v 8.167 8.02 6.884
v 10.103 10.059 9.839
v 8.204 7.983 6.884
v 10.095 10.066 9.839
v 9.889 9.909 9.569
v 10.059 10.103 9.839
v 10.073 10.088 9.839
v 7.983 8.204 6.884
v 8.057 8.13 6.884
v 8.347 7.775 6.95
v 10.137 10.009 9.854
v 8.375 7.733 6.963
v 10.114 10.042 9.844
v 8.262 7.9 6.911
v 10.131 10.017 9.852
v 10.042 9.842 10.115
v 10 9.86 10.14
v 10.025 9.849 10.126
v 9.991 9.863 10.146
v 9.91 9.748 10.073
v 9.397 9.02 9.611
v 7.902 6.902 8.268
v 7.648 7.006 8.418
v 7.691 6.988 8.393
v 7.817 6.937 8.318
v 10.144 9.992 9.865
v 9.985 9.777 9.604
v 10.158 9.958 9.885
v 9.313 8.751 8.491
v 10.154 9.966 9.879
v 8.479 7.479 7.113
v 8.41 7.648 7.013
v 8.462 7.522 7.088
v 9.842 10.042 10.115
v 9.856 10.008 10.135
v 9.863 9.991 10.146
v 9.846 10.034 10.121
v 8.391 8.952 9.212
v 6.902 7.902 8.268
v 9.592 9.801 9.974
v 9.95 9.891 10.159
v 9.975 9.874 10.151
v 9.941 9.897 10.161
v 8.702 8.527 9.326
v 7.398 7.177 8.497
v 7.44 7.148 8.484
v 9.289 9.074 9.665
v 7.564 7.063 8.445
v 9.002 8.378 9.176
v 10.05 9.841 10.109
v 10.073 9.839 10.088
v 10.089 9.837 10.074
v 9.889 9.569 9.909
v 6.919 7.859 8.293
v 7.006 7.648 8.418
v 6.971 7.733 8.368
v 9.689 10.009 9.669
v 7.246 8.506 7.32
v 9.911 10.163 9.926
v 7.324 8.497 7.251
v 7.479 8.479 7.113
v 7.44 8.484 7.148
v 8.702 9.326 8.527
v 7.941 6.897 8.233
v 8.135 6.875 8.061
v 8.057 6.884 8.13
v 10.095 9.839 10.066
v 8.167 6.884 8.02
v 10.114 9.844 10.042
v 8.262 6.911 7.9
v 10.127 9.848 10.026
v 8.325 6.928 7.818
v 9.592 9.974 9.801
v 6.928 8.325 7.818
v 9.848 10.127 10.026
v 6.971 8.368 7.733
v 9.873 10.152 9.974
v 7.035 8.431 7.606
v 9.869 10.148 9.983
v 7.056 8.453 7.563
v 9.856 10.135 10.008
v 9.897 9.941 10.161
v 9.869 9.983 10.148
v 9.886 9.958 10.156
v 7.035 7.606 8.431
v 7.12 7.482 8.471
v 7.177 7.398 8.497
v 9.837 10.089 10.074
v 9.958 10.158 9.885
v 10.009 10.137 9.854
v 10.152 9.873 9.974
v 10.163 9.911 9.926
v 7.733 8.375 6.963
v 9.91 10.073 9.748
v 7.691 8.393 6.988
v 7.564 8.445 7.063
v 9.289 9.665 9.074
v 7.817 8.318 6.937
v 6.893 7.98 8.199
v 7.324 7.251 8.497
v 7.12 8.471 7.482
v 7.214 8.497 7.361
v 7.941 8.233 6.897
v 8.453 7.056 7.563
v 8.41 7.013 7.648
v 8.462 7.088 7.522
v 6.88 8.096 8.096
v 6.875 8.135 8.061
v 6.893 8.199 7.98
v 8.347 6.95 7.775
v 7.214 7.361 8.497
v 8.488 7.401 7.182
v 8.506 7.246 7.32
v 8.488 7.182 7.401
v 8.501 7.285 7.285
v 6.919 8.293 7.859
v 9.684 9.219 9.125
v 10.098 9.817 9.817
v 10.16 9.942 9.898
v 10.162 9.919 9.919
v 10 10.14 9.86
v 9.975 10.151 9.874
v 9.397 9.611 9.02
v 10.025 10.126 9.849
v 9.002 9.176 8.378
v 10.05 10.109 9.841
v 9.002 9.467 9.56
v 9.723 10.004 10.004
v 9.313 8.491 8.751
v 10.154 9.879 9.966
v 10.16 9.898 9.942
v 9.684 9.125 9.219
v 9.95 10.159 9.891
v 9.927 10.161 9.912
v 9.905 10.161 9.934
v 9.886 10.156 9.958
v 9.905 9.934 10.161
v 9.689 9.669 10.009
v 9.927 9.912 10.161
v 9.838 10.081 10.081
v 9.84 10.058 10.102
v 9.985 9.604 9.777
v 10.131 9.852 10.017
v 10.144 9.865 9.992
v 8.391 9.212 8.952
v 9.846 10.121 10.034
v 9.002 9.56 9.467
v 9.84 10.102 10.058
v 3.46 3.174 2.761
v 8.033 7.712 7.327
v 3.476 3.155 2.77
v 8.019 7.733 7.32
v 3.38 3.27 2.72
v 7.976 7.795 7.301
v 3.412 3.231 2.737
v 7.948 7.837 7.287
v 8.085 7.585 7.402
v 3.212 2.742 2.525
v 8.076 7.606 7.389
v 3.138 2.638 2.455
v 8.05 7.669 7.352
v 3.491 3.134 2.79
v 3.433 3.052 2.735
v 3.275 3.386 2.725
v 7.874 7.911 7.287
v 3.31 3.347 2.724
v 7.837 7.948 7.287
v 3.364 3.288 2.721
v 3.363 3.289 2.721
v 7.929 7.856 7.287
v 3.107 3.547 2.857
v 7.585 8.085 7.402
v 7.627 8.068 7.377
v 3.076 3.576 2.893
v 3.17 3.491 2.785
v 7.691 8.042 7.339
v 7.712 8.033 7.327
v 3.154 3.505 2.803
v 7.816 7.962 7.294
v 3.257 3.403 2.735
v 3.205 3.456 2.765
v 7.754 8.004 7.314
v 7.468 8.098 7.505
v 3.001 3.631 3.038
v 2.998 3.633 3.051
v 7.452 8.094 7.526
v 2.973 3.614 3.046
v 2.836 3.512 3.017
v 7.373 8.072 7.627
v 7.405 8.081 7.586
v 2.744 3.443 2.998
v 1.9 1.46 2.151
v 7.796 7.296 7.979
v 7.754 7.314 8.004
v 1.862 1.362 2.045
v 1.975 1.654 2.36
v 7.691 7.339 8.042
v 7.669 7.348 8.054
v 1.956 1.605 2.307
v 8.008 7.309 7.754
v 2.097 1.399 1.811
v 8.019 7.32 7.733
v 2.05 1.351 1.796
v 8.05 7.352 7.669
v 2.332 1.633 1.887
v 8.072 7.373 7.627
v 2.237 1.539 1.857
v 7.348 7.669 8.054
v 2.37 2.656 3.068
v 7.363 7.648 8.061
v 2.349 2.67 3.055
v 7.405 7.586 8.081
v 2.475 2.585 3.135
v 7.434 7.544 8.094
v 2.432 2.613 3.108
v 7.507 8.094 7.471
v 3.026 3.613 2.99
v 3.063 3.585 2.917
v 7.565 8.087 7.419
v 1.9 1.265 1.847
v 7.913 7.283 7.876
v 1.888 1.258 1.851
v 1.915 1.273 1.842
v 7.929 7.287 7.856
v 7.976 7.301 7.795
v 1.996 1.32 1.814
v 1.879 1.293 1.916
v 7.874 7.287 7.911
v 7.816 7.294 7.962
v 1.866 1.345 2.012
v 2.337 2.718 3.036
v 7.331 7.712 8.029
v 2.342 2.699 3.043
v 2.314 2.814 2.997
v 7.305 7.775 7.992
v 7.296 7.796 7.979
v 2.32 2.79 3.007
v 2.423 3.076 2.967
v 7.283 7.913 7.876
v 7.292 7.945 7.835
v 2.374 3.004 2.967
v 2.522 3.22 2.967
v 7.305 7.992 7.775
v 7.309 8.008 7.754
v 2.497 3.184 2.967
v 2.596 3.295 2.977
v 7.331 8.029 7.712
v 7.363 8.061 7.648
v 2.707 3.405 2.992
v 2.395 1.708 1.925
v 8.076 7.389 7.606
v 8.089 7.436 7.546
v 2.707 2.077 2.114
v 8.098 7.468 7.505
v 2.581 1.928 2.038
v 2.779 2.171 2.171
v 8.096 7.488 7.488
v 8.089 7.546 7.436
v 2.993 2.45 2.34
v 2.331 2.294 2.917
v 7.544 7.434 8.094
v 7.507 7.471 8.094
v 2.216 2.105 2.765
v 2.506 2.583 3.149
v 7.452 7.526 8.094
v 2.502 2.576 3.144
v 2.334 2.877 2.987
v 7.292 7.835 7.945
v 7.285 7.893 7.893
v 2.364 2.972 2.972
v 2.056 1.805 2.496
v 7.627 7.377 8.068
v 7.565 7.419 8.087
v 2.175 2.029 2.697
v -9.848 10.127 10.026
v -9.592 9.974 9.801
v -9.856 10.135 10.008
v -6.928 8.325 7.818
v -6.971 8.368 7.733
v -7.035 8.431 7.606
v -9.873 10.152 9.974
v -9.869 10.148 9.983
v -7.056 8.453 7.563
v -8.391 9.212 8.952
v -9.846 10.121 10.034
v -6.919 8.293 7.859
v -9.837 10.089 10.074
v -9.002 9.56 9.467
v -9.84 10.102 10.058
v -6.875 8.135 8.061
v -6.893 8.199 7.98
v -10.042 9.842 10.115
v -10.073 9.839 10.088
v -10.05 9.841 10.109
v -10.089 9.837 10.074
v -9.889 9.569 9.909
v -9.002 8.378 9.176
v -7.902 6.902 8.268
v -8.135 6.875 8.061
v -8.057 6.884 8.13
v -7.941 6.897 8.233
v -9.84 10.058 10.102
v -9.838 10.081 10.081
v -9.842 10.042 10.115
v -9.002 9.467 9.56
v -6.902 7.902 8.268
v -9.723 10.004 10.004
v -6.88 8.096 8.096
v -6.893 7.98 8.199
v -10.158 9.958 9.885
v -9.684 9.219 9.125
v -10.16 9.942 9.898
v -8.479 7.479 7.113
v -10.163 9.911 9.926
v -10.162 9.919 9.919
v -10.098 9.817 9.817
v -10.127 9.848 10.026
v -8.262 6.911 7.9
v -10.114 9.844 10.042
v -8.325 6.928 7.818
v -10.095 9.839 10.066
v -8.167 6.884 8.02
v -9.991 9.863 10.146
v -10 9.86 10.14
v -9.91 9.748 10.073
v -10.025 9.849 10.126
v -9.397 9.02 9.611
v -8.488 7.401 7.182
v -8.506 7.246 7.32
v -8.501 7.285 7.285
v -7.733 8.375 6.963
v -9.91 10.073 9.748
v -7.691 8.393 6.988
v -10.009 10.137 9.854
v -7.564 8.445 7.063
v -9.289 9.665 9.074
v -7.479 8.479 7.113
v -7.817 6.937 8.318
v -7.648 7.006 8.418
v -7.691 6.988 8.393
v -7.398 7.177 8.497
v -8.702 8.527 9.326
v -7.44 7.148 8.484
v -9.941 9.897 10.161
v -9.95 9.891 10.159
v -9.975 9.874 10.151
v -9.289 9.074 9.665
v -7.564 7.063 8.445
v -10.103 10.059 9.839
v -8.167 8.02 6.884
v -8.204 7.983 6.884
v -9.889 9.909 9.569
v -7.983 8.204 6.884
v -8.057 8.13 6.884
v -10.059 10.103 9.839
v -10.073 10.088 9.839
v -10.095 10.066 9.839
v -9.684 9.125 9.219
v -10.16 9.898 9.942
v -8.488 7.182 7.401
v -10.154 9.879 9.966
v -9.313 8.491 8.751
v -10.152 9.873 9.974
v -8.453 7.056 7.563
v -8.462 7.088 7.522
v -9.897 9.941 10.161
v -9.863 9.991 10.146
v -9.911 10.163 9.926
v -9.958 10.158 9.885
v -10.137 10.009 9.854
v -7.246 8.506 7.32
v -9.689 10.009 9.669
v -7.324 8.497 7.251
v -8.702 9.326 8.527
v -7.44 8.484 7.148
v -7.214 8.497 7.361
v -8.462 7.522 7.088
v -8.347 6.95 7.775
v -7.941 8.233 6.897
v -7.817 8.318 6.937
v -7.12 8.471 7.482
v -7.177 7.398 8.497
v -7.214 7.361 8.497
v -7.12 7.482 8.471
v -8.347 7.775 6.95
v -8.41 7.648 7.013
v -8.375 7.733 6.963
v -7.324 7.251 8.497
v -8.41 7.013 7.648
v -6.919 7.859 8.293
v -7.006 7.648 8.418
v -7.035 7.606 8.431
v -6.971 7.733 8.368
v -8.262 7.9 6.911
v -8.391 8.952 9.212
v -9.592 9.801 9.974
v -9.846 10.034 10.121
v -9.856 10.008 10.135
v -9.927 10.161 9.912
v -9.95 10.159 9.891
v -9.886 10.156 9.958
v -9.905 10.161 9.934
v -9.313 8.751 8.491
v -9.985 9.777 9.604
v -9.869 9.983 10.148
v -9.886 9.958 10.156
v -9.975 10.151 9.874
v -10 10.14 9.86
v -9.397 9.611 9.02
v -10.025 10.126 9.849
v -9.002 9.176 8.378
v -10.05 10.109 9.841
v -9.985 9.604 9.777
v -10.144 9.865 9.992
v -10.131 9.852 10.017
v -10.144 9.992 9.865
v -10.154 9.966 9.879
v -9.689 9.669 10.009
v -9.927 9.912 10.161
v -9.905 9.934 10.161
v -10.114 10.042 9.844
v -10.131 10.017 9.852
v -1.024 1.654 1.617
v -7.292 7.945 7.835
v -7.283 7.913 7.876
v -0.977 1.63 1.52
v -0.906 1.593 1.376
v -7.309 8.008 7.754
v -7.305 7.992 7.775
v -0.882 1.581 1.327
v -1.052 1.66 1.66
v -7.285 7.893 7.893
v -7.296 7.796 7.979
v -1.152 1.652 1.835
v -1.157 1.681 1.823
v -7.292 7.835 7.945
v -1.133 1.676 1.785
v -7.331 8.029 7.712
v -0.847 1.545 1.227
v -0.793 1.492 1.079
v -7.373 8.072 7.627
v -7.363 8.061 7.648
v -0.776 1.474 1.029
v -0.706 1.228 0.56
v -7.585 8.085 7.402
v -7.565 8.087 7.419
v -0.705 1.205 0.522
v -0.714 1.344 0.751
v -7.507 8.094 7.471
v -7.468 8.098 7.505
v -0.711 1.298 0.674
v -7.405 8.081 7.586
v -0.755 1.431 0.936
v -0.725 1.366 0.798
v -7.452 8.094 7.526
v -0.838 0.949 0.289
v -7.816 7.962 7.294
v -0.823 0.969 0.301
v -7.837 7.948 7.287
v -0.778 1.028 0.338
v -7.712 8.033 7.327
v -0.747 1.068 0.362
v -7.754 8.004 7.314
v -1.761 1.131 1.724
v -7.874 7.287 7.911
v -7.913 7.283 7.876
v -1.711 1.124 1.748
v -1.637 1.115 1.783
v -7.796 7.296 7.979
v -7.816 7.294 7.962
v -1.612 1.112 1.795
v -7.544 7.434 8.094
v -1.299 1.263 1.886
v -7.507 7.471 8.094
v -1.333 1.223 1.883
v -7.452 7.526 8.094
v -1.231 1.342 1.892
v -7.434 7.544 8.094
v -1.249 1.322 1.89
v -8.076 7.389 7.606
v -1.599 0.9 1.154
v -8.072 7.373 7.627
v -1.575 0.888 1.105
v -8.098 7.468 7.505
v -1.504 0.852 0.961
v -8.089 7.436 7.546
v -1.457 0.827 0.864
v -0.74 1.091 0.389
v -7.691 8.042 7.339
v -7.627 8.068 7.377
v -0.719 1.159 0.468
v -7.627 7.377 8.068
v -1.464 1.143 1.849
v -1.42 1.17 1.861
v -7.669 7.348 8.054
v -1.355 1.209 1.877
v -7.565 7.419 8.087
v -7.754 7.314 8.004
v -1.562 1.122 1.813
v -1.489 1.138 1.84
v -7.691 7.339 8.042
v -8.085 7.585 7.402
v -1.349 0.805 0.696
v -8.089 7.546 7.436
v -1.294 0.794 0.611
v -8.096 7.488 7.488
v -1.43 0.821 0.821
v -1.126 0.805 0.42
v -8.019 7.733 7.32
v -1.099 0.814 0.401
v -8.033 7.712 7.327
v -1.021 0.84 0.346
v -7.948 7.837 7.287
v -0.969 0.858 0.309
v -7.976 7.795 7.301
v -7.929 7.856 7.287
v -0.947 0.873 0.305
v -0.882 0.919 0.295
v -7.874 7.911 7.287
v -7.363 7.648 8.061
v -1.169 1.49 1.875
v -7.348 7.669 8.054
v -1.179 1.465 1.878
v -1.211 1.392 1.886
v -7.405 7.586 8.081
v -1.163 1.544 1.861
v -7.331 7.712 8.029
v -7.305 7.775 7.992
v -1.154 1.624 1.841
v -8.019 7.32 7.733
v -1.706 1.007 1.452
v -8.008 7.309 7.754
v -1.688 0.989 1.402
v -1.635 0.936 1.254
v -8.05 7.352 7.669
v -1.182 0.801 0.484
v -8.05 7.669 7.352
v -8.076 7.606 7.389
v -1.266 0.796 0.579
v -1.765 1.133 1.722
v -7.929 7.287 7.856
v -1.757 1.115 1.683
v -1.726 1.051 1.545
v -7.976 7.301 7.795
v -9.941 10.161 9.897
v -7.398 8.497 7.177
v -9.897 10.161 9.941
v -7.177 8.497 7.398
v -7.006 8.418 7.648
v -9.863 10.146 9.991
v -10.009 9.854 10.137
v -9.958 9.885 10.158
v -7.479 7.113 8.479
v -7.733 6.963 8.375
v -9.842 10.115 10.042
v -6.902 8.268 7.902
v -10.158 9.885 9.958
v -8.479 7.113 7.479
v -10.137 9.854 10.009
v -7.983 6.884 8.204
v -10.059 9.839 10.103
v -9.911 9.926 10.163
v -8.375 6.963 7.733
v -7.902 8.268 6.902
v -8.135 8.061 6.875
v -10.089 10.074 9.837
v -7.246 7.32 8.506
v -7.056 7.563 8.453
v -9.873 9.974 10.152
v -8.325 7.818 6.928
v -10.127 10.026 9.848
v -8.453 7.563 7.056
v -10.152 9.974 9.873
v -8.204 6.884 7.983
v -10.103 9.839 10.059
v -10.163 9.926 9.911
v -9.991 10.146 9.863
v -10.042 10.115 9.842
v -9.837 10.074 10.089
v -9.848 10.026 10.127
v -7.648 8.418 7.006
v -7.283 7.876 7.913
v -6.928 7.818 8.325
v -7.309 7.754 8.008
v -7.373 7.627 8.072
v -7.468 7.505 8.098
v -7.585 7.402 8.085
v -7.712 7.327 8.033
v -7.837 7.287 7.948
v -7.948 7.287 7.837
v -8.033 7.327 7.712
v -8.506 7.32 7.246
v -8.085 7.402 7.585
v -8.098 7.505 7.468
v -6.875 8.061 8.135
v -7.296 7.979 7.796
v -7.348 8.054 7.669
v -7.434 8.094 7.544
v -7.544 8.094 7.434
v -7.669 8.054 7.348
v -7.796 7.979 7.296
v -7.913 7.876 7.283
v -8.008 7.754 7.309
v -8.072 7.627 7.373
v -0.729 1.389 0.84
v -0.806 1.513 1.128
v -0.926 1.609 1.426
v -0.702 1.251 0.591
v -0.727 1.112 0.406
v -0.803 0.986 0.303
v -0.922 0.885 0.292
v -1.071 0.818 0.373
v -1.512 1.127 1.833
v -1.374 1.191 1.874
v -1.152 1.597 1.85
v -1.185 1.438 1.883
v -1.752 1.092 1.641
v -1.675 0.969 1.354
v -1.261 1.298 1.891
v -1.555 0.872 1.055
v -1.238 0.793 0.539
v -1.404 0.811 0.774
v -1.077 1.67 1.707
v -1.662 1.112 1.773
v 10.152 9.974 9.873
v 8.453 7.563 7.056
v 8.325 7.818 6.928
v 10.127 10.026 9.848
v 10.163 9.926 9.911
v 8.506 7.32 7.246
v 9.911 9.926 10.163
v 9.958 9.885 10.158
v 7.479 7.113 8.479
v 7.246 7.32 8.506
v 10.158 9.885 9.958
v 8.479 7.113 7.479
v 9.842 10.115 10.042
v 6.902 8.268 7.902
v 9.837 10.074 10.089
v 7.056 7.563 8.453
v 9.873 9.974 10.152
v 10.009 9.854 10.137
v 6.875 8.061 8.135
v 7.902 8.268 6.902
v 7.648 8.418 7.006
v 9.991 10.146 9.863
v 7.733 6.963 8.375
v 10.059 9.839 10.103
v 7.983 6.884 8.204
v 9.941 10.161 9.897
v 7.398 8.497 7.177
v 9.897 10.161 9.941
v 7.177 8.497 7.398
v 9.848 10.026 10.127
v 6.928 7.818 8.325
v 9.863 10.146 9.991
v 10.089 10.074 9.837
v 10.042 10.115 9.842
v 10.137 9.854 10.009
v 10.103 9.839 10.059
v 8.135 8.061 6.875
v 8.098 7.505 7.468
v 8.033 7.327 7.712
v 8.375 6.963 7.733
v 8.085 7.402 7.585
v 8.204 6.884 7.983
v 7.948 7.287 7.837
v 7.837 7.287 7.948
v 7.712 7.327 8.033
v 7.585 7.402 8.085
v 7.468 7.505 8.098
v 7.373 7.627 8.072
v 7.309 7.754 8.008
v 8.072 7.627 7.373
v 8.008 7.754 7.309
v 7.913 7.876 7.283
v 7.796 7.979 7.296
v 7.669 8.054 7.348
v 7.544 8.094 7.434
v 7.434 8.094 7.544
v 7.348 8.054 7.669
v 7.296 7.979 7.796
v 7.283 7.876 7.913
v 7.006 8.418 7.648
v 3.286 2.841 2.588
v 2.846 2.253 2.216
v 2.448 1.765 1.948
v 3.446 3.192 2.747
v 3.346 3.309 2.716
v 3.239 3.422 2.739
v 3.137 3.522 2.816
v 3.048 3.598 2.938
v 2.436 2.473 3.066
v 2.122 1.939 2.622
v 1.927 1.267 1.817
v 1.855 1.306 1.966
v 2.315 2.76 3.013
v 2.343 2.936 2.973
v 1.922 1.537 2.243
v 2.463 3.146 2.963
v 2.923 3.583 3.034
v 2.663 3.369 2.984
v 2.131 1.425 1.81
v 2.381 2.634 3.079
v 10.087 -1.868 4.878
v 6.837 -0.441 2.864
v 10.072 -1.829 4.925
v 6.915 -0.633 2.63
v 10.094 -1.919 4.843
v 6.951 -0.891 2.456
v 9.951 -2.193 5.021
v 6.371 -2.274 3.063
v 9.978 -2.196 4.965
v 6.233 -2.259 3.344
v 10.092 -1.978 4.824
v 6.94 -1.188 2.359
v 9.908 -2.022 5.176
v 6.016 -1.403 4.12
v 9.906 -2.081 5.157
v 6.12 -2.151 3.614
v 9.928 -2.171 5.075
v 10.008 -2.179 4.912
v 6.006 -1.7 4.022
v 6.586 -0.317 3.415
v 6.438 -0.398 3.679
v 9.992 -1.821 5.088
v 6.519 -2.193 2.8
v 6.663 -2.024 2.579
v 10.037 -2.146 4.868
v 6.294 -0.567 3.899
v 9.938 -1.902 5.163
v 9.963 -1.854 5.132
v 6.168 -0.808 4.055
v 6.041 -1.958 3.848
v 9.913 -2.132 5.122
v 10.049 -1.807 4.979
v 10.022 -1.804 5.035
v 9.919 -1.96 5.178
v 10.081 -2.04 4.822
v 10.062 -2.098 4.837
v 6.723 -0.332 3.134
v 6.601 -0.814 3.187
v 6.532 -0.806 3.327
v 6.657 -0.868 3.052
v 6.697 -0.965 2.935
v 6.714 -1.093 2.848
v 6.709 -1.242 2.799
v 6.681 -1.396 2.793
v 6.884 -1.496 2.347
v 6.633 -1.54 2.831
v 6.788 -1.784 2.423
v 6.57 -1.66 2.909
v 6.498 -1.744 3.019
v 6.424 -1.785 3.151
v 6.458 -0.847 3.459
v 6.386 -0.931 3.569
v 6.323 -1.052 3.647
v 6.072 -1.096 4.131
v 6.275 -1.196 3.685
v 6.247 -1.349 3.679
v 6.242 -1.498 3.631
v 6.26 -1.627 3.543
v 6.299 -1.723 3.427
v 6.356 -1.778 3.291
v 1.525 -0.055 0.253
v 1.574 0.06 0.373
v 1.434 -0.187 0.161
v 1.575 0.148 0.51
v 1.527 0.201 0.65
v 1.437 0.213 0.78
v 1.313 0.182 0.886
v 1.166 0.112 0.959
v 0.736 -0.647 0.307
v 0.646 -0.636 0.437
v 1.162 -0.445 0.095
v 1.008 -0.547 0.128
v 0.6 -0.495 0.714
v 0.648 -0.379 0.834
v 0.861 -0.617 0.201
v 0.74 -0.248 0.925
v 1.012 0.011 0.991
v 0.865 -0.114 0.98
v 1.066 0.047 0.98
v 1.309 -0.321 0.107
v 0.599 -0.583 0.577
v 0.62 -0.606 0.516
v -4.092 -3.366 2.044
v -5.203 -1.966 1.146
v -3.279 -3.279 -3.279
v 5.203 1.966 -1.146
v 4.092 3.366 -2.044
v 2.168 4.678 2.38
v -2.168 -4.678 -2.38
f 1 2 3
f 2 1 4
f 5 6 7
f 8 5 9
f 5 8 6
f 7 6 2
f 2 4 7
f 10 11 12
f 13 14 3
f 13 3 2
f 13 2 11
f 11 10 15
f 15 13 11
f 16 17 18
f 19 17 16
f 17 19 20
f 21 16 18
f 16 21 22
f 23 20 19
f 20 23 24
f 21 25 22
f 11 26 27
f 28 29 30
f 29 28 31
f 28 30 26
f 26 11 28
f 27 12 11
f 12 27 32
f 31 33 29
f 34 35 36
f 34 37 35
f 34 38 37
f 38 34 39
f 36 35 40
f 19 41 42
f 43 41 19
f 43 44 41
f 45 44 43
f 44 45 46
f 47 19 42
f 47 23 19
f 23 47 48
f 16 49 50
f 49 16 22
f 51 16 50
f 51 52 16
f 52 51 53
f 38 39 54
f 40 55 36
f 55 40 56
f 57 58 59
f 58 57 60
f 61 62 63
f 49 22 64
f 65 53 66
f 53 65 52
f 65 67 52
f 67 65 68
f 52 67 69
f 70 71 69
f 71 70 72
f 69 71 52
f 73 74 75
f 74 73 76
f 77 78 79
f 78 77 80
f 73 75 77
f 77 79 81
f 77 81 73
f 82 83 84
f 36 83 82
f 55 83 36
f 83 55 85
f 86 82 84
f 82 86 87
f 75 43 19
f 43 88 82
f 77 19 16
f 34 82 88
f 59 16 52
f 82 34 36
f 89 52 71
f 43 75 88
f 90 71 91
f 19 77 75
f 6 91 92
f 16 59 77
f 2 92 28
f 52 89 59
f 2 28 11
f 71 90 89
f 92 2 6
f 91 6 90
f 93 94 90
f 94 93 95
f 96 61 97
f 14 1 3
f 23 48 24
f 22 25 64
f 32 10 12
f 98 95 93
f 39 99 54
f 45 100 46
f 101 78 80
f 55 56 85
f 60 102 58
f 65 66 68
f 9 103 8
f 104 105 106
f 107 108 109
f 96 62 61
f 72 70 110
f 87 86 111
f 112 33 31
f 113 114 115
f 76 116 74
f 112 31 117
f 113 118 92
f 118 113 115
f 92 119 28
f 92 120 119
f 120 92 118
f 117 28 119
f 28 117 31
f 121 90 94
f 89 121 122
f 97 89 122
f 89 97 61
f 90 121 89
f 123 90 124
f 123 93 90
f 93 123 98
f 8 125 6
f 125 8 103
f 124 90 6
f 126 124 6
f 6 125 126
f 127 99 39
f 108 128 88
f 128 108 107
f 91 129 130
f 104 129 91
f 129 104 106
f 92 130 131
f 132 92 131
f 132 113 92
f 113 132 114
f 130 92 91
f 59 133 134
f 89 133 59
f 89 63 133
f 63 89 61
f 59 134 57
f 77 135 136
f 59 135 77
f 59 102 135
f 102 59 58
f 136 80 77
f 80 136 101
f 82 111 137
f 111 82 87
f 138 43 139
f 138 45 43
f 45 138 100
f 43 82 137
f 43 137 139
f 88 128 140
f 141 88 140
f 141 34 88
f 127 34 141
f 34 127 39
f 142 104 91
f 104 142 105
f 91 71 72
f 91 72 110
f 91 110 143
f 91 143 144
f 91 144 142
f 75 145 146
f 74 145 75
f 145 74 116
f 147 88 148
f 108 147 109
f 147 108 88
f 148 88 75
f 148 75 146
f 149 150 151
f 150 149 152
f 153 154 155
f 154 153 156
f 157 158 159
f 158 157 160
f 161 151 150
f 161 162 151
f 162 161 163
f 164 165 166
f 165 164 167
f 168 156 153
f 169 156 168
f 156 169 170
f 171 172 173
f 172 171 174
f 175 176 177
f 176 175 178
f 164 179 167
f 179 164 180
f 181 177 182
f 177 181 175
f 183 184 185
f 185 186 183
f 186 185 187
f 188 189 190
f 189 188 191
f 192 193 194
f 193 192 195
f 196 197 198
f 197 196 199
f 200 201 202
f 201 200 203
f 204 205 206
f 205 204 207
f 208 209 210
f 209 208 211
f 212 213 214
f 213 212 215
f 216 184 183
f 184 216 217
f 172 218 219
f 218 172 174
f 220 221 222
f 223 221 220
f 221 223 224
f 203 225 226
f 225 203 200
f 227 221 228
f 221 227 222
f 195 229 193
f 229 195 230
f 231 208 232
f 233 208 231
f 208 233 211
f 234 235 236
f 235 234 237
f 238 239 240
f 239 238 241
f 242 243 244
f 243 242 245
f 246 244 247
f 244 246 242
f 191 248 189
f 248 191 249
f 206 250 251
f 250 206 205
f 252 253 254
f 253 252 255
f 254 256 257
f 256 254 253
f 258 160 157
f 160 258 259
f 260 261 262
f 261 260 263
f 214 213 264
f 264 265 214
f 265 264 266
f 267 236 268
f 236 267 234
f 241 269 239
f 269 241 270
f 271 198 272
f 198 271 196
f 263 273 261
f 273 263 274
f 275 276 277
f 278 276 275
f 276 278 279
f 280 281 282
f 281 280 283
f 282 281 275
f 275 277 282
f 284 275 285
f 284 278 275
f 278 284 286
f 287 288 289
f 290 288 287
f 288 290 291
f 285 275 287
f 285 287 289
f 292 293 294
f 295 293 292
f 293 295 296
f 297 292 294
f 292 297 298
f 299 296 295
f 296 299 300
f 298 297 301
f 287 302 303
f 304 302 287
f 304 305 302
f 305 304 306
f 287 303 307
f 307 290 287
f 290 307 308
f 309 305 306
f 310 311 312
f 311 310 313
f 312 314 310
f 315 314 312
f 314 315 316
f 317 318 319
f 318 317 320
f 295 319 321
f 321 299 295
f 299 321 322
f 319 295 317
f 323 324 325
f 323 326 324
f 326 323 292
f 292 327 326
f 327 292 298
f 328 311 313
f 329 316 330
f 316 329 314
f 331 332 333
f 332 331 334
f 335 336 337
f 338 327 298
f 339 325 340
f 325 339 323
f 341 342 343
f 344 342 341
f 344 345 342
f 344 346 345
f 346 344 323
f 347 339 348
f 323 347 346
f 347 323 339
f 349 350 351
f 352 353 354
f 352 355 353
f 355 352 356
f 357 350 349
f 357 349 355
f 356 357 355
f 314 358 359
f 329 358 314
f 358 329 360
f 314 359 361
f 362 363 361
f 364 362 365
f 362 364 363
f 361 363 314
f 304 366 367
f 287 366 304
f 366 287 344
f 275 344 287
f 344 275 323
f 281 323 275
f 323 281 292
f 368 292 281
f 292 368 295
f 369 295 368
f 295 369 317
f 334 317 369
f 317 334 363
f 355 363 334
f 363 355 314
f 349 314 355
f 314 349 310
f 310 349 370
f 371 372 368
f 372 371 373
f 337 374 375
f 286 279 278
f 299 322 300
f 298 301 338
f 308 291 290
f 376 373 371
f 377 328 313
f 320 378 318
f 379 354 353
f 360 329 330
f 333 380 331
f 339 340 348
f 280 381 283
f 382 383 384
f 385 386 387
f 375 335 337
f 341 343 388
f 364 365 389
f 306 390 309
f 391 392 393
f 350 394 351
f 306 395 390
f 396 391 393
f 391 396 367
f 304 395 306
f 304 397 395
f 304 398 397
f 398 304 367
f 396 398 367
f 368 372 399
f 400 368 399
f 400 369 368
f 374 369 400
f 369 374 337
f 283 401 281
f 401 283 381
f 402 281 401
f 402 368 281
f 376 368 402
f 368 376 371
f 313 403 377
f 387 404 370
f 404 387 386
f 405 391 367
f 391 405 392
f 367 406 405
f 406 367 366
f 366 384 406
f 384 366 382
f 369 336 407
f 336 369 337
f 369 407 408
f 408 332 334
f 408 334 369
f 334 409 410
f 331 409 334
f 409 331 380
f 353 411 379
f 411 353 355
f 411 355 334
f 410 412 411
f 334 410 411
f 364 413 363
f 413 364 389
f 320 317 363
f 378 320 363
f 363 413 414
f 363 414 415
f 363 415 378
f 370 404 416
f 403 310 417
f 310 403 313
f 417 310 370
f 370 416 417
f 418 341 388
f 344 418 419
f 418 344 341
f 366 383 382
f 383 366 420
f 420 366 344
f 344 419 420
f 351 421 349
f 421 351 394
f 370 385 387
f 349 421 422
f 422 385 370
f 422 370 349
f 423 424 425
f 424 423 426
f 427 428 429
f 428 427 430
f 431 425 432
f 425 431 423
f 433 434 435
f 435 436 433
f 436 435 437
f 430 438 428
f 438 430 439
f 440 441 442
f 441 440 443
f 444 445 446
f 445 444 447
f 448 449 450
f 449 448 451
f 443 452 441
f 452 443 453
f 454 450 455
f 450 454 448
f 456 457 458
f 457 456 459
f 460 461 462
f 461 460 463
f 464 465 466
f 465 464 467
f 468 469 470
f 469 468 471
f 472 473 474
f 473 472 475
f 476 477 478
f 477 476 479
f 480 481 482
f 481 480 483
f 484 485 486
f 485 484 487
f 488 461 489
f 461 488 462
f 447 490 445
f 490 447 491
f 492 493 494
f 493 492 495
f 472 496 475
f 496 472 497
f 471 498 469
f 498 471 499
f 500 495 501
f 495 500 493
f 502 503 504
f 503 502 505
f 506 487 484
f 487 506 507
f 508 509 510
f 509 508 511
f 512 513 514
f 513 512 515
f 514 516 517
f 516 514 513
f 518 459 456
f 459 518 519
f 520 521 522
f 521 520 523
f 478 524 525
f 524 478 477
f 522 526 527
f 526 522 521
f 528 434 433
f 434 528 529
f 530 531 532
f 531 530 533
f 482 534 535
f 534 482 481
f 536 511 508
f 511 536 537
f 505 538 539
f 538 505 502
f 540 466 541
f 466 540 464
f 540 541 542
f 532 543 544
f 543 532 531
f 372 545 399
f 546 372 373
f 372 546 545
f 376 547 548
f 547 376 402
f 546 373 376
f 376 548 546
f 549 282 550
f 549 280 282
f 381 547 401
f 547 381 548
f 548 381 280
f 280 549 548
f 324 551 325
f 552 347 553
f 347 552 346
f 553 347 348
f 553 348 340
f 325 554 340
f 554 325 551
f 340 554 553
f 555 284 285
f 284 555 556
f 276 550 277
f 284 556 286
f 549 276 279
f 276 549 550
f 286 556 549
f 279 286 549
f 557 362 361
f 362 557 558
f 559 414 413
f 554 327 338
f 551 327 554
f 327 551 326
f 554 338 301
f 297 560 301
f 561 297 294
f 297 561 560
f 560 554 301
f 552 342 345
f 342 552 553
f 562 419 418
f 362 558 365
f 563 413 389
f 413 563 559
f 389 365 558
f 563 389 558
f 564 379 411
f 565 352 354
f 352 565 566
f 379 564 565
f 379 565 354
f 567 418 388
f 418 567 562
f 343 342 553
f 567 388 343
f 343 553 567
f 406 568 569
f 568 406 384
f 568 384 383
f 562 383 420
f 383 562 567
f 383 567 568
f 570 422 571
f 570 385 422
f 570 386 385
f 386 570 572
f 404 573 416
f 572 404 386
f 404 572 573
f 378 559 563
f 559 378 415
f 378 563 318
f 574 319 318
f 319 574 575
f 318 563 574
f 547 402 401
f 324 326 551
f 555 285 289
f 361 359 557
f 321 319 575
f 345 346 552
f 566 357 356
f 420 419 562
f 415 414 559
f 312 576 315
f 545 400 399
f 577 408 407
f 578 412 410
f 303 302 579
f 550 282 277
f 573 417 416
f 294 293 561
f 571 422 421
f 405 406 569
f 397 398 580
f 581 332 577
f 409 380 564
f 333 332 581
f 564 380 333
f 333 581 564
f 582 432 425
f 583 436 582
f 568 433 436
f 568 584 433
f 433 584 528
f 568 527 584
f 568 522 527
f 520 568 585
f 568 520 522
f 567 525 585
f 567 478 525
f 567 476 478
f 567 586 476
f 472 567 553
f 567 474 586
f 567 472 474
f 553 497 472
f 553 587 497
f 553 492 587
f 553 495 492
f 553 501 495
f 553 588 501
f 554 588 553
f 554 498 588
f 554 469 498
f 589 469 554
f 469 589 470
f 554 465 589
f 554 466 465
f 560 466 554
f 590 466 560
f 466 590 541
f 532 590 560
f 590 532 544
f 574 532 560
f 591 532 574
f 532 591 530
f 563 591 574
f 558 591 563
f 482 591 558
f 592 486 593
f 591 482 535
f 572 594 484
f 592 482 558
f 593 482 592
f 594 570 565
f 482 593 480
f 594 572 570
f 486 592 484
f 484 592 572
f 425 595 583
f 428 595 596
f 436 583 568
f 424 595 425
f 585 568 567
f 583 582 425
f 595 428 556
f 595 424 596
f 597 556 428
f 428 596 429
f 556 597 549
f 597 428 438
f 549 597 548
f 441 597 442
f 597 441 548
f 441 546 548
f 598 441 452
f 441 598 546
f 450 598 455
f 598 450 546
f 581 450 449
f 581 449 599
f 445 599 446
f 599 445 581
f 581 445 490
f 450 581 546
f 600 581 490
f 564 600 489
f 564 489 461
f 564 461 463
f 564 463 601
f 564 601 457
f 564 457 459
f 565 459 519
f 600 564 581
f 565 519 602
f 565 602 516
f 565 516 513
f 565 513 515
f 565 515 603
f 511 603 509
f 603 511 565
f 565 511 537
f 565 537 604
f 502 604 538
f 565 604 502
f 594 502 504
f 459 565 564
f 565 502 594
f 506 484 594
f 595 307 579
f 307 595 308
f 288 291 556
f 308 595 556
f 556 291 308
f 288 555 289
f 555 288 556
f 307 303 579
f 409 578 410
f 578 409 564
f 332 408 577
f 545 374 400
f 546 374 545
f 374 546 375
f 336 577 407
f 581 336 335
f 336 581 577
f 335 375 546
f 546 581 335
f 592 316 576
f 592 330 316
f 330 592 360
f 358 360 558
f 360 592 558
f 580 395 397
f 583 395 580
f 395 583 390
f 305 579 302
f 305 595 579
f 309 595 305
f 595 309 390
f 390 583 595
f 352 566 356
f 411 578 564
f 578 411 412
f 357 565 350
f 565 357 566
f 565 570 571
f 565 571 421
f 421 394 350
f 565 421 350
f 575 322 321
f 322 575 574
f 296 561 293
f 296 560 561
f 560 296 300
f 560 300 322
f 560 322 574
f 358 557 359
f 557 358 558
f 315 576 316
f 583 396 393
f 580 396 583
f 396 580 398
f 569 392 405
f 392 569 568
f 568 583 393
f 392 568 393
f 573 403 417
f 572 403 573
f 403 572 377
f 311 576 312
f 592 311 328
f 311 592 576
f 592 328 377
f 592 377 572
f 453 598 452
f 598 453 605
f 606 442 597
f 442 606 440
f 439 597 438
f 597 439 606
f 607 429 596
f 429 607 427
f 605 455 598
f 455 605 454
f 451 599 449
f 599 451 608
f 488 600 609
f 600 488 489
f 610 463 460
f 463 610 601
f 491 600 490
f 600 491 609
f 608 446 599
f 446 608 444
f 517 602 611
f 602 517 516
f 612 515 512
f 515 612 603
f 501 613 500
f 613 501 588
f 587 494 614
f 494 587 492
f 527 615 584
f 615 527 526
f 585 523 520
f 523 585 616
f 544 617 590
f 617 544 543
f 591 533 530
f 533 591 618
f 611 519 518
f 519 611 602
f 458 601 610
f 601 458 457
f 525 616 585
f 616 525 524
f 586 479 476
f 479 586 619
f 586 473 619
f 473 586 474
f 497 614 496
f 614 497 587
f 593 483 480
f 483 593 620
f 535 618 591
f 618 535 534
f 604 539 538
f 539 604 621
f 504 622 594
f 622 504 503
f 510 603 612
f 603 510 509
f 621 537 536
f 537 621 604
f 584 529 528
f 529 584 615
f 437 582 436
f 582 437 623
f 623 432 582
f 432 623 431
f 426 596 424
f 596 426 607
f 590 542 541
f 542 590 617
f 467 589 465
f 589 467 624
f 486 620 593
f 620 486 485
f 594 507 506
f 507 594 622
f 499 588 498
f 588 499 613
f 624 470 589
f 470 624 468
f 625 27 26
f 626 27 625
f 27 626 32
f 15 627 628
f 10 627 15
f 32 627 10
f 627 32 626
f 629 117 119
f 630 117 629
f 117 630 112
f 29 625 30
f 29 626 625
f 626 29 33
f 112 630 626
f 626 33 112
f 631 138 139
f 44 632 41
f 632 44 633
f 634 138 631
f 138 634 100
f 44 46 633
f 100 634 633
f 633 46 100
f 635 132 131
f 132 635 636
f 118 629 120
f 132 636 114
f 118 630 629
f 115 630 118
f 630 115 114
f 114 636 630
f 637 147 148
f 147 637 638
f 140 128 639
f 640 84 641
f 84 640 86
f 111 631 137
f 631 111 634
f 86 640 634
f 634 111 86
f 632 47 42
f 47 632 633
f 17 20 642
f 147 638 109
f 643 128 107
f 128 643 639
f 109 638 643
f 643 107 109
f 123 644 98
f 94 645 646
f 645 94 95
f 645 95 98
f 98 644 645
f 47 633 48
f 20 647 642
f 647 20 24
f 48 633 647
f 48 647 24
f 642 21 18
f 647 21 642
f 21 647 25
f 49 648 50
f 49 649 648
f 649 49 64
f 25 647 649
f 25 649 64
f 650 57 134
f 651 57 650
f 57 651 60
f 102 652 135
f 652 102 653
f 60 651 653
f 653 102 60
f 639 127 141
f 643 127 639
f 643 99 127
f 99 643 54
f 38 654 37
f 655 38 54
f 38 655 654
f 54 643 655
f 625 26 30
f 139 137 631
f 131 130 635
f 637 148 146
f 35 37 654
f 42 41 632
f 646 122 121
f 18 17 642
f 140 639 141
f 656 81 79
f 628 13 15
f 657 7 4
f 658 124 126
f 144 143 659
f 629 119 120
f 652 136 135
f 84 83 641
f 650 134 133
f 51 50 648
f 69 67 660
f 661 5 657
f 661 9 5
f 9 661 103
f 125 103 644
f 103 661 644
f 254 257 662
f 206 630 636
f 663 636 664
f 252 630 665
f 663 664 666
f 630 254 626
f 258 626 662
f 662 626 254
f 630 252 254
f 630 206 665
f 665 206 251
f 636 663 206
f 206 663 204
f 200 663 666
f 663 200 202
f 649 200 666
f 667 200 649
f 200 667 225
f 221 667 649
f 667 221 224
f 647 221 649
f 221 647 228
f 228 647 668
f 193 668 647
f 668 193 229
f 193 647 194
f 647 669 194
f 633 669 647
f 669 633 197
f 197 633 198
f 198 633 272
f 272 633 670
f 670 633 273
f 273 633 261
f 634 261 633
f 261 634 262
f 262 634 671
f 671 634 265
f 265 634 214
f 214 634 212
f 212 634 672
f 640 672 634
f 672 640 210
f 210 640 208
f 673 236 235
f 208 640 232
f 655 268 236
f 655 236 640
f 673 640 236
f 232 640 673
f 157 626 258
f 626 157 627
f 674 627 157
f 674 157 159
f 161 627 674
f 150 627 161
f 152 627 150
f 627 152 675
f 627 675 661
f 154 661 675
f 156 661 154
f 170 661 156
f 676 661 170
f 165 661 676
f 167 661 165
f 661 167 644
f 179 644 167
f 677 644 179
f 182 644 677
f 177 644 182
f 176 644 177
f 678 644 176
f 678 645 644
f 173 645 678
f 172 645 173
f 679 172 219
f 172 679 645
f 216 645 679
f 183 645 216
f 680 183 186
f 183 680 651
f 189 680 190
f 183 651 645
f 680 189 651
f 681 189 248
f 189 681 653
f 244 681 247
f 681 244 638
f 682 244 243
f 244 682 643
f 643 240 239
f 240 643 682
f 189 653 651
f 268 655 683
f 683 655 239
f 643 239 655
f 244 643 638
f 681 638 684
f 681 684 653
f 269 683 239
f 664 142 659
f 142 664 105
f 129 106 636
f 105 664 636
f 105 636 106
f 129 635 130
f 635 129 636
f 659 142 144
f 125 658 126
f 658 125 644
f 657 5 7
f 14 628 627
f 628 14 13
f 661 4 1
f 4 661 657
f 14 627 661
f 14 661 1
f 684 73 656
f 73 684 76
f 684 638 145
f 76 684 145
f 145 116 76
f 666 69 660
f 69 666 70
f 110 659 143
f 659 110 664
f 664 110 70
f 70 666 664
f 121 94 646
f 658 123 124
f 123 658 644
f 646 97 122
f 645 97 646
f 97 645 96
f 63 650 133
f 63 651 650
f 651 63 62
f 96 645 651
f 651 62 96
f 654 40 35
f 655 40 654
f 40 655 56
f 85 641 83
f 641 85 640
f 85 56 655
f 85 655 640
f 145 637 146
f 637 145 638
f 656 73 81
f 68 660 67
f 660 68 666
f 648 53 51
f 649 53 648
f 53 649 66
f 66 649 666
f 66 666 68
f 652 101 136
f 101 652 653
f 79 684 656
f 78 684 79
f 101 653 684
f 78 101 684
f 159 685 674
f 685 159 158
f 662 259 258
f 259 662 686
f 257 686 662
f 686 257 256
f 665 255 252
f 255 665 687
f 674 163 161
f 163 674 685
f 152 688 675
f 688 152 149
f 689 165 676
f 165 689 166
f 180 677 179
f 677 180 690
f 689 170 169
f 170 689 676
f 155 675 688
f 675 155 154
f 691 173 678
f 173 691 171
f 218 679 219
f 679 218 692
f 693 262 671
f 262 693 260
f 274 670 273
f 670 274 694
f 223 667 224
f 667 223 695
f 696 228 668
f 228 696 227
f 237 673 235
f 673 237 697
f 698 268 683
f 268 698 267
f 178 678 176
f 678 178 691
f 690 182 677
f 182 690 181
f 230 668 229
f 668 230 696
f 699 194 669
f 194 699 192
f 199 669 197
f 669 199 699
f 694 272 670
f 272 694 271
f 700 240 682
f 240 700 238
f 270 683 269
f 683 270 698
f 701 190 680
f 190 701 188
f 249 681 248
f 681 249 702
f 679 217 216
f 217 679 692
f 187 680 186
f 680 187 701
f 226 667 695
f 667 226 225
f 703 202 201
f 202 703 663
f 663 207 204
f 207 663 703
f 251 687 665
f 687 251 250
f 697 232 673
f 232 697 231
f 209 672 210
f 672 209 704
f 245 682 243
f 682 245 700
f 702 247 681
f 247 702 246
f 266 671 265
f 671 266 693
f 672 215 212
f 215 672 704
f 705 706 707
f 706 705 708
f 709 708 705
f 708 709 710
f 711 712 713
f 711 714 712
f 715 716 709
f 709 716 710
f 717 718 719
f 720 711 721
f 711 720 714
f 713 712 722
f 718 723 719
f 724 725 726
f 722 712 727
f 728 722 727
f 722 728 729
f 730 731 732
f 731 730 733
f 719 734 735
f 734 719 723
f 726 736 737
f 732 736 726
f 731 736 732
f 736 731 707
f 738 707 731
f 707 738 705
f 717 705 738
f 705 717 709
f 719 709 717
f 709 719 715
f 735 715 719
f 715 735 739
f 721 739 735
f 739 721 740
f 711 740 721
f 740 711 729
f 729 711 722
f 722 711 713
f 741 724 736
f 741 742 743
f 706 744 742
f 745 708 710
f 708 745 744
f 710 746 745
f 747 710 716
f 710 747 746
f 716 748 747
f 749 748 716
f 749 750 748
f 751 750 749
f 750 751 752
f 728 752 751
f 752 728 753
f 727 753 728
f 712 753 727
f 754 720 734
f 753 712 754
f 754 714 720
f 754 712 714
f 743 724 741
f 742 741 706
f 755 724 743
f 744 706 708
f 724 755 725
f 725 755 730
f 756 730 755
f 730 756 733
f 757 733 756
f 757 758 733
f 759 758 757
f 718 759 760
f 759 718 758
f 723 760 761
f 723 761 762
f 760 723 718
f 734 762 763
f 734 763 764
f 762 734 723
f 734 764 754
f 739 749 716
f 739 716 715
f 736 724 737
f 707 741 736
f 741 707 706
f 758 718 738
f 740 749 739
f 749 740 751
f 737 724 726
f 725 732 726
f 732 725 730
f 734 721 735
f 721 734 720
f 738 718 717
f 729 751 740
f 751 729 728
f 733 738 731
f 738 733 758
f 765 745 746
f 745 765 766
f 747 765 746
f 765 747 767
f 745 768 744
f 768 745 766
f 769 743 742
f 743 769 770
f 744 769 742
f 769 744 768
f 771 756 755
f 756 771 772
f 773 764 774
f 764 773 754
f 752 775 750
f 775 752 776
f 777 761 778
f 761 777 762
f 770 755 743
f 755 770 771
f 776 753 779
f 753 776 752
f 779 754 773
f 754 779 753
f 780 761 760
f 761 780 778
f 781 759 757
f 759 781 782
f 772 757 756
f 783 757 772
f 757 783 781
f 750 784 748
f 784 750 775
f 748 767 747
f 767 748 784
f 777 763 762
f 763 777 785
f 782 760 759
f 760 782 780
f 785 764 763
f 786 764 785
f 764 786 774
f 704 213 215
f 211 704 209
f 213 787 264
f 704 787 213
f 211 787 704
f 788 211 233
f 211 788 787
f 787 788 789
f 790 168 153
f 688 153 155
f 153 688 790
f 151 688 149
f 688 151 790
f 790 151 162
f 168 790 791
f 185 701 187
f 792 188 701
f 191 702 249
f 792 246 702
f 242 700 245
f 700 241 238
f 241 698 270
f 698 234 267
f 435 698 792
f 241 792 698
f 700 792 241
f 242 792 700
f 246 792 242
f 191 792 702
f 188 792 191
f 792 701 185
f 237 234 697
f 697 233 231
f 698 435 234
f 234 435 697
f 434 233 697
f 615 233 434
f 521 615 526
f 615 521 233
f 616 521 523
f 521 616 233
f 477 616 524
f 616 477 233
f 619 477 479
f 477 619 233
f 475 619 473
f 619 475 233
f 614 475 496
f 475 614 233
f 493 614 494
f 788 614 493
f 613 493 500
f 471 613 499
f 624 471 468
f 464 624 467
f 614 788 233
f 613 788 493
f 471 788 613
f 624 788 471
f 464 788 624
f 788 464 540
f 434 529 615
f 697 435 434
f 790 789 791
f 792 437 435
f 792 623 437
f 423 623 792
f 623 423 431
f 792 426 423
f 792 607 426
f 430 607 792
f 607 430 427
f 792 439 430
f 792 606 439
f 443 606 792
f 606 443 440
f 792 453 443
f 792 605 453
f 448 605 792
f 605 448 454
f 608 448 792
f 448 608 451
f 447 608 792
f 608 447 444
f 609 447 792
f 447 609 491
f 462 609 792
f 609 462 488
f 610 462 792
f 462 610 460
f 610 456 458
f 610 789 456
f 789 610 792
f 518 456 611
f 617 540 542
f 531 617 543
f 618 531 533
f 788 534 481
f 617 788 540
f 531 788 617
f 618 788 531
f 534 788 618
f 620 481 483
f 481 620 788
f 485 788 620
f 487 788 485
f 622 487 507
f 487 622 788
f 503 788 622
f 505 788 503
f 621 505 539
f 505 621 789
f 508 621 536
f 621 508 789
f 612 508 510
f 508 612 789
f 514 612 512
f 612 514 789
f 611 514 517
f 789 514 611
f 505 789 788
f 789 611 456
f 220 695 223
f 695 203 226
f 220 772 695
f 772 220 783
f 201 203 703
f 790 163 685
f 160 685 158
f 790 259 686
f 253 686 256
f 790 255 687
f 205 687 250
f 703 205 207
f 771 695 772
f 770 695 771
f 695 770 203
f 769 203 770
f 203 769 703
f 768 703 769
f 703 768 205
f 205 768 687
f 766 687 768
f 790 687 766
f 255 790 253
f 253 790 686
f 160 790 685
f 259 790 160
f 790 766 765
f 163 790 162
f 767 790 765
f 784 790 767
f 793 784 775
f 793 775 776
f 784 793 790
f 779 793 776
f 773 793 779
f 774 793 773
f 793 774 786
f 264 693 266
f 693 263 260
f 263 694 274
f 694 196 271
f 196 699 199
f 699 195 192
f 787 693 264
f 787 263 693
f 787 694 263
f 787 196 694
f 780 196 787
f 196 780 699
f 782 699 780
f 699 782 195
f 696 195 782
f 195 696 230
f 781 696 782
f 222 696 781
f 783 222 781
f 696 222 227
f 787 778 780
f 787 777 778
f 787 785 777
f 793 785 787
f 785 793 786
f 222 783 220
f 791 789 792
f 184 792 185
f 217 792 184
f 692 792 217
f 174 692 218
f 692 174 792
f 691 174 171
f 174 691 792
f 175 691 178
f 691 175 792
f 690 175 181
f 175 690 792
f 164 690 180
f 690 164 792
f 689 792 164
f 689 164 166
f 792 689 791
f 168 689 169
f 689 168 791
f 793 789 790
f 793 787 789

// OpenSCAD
//---------------------------------------------------------------
//-- Openscad vector library
//-- This is a component of the obiscad opescad tools by Obijuan
//-- (C) Juan Gonzalez-Gomez (Obijuan)
//-- Sep-2012
//---------------------------------------------------------------
//-- Released under the GPL license
//---------------------------------------------------------------

//-- Updated orientate function to correct singularity when v lies along vref

//----------------------------------------
//-- FUNCTIONS FOR WORKING WITH VECTORS
//----------------------------------------

//-- Calculate the module of a vector
function mod(v) = (sqrt(v[0]*v[0]+v[1]*v[1]+v[2]*v[2]));

//-- Calculate the cros product of two vectors
function cross(u,v) = [
  u[1]*v[2] - v[1]*u[2],
  -(u[0]*v[2] - v[0]*u[2]) ,
  u[0]*v[1] - v[0]*u[1]];

//-- Calculate the dot product of two vectors
function dot(u,v) = u[0]*v[0]+u[1]*v[1]+u[2]*v[2];

//-- Return the unit vector of a vector
function unitv(v) = v/mod(v);

//-- Return the angle between two vectores
function anglev(u,v) = acos( dot(u,v) / (mod(u)*mod(v)) );

//----------------------------------------------------------
//--  Draw a point in the position given by the vector p  
//----------------------------------------------------------
module point(p)
{
  translate(p)
    sphere(r=0.7,$fn=20);
}

//------------------------------------------------------------------
//-- Draw a vector poiting to the z axis
//-- This is an auxiliary module for implementing the vector module
//--
//-- Parameters:
//--  l: total vector length (line + arrow)
//--  l_arrow: Vector arrow length
//--  mark: If true, a mark is draw in the vector head, for having
//--    a visual reference of the rolling angle
//------------------------------------------------------------------
module vectorz(l=10, l_arrow=4, mark=false)
{
  //-- vector body length (not including the arrow)
  lb = l - l_arrow;

  //-- The vector is locatead at 0,0,0
  translate([0,0,lb/2])
  union() {

    //-- Draw the arrow
    translate([0,0,lb/2])
      cylinder(r1=2/2, r2=0.2, h=l_arrow, $fn=20);

    //-- Draw the mark
    if (mark) {
      translate([0,0,lb/2+l_arrow/2])
      translate([1,0,0])
        cube([2,0.3,l_arrow*0.8],center=true);
    }

    //-- Draw the body
    cylinder(r=1/2, h=lb, center=true, $fn=20);
  }

  //-- Draw a sphere in the vector base
  sphere(r=1/2, $fn=20);
}

//-----------------------------------------------------------------
//-- ORIENTATE OPERATOR
//--
//--  Orientate an object to the direction given by the vector v
//--  Parameters:
//--    v : Target orientation
//--    vref: Vector reference. It is the vector of the local frame
//--          of the object that want to be poiting in the direction
//--          of v
//--    roll: Rotation of the object around the v axis
//-------------------------------------------------------------------
module orientate(v,vref=[0,0,1], roll=0)
{
  //-- Calculate the rotation axis
  raxis = v[0]==vref[0] && v[1]==vref[1] ? [0,1,0] : cross(vref,v);
  
  //-- Calculate the angle between the vectors
  ang = anglev(vref,v);

  //-- Rotate the child!
  rotate(a=roll, v=v)
    rotate(a=ang, v=raxis)
      children(0);
}

module orientate2(v,vref=[0,0,1], roll=0)
{
  //-- Calculate the rotation axis
  raxis = cross(vref,v);
  
  //-- Calculate the angle between the vectors
  ang = anglev(vref,v);

  //-- Rotate the child!
  rotate(a=roll, v=v)
    rotate(a=ang, v=raxis)
      children(0);
}

//---------------------------------------------------------------------------
//-- Draw a vector 
//--
//-- There are two modes of drawing the vector
//-- * Mode 1: Given by a cartesian point(x,y,z). A vector from the origin
//--           to the end (x,y,z) is drawn. The l parameter (length) must 
//--           be 0  (l=0)
//-- * Mode 2: Give by direction and length
//--           A vector of length l pointing to the direction given by
//--           v is drawn
//---------------------------------------------------------------------------
//-- Parameters:
//--  v: Vector cartesian coordinates
//--  l: total vector length (line + arrow)
//--  l_arrow: Vector arrow length
//    mark: If true, a mark is draw in the vector head, for having
//--    a visual reference of the rolling angle
//---------------------------------------------------------------------------
module vector(v,l=0, l_arrow=4, mark=false)
{
  //-- Get the vector length from the coordinates
  mod = mod(v);

  //-- The vector is very easy implemented by means of the orientate
  //-- operator:
  //--  orientate(v) vectorz(l=mod, l_arrow=l_arrow)
  //--  BUT... in OPENSCAD 2012.02.22 the recursion does not
  //--    not work, so that if the user use the orientate operator
  //--    on a vector, openscad will ignore it..
  //-- The solution at the moment (I hope the openscad developers
  //--  implement the recursion in the near future...)
  //--  is to repite the orientate operation in this module

  //---- SAME CALCULATIONS THAN THE ORIENTATE OPERATOR!
  //-- Calculate the rotation axis

  vref = [0,0,1];
  raxis = cross(vref,v);
  
  //-- Calculate the angle between the vectors
  ang = anglev(vref,v);

  //-- orientate the vector
  //-- Draw the vector. The vector length is given either
  //--- by the mod variable (when l=0) or by l (when l!=0)
  if (l==0)
    rotate(a=ang, v=raxis)
      vectorz(l=mod, l_arrow=l_arrow, mark=mark);
  else
    rotate(a=ang, v=raxis)
      vectorz(l=l, l_arrow=l_arrow, mark=mark);

}

//----------------------------------------------------
//-- Draw a Frame of reference
//-- Parameters:
//-- l: length of the Unit vectors
//-----------------------------------------------------
module frame(l=10, l_arrow=4)
{

  //-- Z unit vector
  color("Blue")
    vector([0,0,l], l_arrow=l_arrow);

  //-- X unit vector
  color("Red")
    vector([l,0,0], l_arrow=l_arrow );

  //-- Y unit vector
  color("Green")
    vector([0,l,0],l_arrow=l_arrow);

  //-- Origin
  color("Gray")
    sphere(r=1, $fn=20);
}

//--------------------------------------------------
//-- Modules for testings and examples
//-- Testing that the vector library is working ok
//--------------------------------------------------

//-- 22 vectors in total are drawn, poiting to different directions
module Test_vectors1()
{

  a = 20;
  k = 1;

  //--  Add a frame of reference (in the origin)
  frame(l=a);

  //-- Negative vectors, pointing towards the three axis: -x, -y, -z
  color("Red")   vector([-a, 0,  0]);
  color("Green") vector([0, -a,  0]);
  color("Blue")  vector([0,  0, -a]);

  //-- It is *not* has been implemented using a for loop on purpose
  //-- This way, individual vectors can be commented out or highlighted

  //-- vectors with positive z
  vector([a,   a, a*k]);
  vector([0,   a, a*k]);
  vector([-a,  a, a*k]);
  vector([-a,  0, a*k]);

  vector([-a, -a, a*k]);
  vector([0,  -a, a*k]);
  vector([a,  -a, a*k]);
  vector([a,   0, a*k]);


  //-- Vectors with negative z
  vector([a,   a, -a*k]);
  vector([0,   a, -a*k]);
  vector([-a,  a, -a*k]);
  vector([-a,  0, -a*k]);

  vector([-a, -a, -a*k]);
  vector([0,  -a, -a*k]);
  vector([a,  -a, -a*k]);
  vector([a,   0, -a*k]);
}

//--- Another test...
module Test_vectors2()
{

  //-- Add the vector into the vector table
  //-- This vectors are taken as directions
  //-- All the vectors will be drawn with the same length (l)
  vector_table = [
    [1,   1, 1],
    [0,   1, 1],
    [-1,  1, 1],
    [-1,  0, 1],
    [-1, -1, 1],
    [0,  -1, 1],
    [1,  -1, 1],
    [1,   0, 1],
  
    [1,   1, -1],
    [0,   1, -1],
    [-1,  1, -1],
    [-1,  0, -1],
    [-1, -1, -1],
    [0,  -1, -1],
    [1,  -1, -1],
    [1,   0, -1],
  ];

  //-- Vector length
  l=20;

  frame(l=10);

  //-- Draw all the vector given in the table
  //-- The vectors point to the direction given in the table
  //-- They all are drawn with a length equal to l
  for (v=vector_table) {
    //-- Vector given by direction and length
    vector(v,l=l);
  }
}


//-- Test the cross product and the angle
//-- between vectors
module Test_vector3()
{
  //-- Start with 2 unit vectors
  v=unitv([1,1,1]);
  u=unitv([0,1,0]);

  //-- Draw the vector in different colors
  //-- Increase the length for drawing
  color("Red") vector(v*20);
  color("blue") vector(u*20);

  //-- Get the cross product
  w = cross(v,u);
  vector(w*20);

  //-- The cross product is NOT conmutative... 
  //-- change the order of v and u
  w2 = cross(u,v);
  vector(w2*20);

  //-- w should be perpendicular to v and u
  //-- Calculate the angles between them:
  echo("U , V: ", anglev(u,v));
  echo("W , U: ", anglev(w,u));
  echo("W , V: ", anglev(w,v));

}

//-- Test the orientate operator
module Test_vector4()
{
  o = [10,10,10];
  v = [-10,10,10];

  color("Red") vector(o);
  color("Blue") vector(v);

  //-- Orientate the vector o in the direction of v
  orientate(v,o)
    vector(o);

  //-- Inverse operation: orientate the v vector in the direction
  //-- of o
  orientate(o,v)
    vector(v);

  //-- Example of orientation of a cube
  orientate(o,vref=[10,-2,5],roll=0)
    cube([10,2,5],center=true);

  vector([10,-2,5]);

}

//-------- Perform tests......

Test_vector4();


/*

Test_vectors1();


translate([60,0,0]) 
  Test_vectors2();
*/
